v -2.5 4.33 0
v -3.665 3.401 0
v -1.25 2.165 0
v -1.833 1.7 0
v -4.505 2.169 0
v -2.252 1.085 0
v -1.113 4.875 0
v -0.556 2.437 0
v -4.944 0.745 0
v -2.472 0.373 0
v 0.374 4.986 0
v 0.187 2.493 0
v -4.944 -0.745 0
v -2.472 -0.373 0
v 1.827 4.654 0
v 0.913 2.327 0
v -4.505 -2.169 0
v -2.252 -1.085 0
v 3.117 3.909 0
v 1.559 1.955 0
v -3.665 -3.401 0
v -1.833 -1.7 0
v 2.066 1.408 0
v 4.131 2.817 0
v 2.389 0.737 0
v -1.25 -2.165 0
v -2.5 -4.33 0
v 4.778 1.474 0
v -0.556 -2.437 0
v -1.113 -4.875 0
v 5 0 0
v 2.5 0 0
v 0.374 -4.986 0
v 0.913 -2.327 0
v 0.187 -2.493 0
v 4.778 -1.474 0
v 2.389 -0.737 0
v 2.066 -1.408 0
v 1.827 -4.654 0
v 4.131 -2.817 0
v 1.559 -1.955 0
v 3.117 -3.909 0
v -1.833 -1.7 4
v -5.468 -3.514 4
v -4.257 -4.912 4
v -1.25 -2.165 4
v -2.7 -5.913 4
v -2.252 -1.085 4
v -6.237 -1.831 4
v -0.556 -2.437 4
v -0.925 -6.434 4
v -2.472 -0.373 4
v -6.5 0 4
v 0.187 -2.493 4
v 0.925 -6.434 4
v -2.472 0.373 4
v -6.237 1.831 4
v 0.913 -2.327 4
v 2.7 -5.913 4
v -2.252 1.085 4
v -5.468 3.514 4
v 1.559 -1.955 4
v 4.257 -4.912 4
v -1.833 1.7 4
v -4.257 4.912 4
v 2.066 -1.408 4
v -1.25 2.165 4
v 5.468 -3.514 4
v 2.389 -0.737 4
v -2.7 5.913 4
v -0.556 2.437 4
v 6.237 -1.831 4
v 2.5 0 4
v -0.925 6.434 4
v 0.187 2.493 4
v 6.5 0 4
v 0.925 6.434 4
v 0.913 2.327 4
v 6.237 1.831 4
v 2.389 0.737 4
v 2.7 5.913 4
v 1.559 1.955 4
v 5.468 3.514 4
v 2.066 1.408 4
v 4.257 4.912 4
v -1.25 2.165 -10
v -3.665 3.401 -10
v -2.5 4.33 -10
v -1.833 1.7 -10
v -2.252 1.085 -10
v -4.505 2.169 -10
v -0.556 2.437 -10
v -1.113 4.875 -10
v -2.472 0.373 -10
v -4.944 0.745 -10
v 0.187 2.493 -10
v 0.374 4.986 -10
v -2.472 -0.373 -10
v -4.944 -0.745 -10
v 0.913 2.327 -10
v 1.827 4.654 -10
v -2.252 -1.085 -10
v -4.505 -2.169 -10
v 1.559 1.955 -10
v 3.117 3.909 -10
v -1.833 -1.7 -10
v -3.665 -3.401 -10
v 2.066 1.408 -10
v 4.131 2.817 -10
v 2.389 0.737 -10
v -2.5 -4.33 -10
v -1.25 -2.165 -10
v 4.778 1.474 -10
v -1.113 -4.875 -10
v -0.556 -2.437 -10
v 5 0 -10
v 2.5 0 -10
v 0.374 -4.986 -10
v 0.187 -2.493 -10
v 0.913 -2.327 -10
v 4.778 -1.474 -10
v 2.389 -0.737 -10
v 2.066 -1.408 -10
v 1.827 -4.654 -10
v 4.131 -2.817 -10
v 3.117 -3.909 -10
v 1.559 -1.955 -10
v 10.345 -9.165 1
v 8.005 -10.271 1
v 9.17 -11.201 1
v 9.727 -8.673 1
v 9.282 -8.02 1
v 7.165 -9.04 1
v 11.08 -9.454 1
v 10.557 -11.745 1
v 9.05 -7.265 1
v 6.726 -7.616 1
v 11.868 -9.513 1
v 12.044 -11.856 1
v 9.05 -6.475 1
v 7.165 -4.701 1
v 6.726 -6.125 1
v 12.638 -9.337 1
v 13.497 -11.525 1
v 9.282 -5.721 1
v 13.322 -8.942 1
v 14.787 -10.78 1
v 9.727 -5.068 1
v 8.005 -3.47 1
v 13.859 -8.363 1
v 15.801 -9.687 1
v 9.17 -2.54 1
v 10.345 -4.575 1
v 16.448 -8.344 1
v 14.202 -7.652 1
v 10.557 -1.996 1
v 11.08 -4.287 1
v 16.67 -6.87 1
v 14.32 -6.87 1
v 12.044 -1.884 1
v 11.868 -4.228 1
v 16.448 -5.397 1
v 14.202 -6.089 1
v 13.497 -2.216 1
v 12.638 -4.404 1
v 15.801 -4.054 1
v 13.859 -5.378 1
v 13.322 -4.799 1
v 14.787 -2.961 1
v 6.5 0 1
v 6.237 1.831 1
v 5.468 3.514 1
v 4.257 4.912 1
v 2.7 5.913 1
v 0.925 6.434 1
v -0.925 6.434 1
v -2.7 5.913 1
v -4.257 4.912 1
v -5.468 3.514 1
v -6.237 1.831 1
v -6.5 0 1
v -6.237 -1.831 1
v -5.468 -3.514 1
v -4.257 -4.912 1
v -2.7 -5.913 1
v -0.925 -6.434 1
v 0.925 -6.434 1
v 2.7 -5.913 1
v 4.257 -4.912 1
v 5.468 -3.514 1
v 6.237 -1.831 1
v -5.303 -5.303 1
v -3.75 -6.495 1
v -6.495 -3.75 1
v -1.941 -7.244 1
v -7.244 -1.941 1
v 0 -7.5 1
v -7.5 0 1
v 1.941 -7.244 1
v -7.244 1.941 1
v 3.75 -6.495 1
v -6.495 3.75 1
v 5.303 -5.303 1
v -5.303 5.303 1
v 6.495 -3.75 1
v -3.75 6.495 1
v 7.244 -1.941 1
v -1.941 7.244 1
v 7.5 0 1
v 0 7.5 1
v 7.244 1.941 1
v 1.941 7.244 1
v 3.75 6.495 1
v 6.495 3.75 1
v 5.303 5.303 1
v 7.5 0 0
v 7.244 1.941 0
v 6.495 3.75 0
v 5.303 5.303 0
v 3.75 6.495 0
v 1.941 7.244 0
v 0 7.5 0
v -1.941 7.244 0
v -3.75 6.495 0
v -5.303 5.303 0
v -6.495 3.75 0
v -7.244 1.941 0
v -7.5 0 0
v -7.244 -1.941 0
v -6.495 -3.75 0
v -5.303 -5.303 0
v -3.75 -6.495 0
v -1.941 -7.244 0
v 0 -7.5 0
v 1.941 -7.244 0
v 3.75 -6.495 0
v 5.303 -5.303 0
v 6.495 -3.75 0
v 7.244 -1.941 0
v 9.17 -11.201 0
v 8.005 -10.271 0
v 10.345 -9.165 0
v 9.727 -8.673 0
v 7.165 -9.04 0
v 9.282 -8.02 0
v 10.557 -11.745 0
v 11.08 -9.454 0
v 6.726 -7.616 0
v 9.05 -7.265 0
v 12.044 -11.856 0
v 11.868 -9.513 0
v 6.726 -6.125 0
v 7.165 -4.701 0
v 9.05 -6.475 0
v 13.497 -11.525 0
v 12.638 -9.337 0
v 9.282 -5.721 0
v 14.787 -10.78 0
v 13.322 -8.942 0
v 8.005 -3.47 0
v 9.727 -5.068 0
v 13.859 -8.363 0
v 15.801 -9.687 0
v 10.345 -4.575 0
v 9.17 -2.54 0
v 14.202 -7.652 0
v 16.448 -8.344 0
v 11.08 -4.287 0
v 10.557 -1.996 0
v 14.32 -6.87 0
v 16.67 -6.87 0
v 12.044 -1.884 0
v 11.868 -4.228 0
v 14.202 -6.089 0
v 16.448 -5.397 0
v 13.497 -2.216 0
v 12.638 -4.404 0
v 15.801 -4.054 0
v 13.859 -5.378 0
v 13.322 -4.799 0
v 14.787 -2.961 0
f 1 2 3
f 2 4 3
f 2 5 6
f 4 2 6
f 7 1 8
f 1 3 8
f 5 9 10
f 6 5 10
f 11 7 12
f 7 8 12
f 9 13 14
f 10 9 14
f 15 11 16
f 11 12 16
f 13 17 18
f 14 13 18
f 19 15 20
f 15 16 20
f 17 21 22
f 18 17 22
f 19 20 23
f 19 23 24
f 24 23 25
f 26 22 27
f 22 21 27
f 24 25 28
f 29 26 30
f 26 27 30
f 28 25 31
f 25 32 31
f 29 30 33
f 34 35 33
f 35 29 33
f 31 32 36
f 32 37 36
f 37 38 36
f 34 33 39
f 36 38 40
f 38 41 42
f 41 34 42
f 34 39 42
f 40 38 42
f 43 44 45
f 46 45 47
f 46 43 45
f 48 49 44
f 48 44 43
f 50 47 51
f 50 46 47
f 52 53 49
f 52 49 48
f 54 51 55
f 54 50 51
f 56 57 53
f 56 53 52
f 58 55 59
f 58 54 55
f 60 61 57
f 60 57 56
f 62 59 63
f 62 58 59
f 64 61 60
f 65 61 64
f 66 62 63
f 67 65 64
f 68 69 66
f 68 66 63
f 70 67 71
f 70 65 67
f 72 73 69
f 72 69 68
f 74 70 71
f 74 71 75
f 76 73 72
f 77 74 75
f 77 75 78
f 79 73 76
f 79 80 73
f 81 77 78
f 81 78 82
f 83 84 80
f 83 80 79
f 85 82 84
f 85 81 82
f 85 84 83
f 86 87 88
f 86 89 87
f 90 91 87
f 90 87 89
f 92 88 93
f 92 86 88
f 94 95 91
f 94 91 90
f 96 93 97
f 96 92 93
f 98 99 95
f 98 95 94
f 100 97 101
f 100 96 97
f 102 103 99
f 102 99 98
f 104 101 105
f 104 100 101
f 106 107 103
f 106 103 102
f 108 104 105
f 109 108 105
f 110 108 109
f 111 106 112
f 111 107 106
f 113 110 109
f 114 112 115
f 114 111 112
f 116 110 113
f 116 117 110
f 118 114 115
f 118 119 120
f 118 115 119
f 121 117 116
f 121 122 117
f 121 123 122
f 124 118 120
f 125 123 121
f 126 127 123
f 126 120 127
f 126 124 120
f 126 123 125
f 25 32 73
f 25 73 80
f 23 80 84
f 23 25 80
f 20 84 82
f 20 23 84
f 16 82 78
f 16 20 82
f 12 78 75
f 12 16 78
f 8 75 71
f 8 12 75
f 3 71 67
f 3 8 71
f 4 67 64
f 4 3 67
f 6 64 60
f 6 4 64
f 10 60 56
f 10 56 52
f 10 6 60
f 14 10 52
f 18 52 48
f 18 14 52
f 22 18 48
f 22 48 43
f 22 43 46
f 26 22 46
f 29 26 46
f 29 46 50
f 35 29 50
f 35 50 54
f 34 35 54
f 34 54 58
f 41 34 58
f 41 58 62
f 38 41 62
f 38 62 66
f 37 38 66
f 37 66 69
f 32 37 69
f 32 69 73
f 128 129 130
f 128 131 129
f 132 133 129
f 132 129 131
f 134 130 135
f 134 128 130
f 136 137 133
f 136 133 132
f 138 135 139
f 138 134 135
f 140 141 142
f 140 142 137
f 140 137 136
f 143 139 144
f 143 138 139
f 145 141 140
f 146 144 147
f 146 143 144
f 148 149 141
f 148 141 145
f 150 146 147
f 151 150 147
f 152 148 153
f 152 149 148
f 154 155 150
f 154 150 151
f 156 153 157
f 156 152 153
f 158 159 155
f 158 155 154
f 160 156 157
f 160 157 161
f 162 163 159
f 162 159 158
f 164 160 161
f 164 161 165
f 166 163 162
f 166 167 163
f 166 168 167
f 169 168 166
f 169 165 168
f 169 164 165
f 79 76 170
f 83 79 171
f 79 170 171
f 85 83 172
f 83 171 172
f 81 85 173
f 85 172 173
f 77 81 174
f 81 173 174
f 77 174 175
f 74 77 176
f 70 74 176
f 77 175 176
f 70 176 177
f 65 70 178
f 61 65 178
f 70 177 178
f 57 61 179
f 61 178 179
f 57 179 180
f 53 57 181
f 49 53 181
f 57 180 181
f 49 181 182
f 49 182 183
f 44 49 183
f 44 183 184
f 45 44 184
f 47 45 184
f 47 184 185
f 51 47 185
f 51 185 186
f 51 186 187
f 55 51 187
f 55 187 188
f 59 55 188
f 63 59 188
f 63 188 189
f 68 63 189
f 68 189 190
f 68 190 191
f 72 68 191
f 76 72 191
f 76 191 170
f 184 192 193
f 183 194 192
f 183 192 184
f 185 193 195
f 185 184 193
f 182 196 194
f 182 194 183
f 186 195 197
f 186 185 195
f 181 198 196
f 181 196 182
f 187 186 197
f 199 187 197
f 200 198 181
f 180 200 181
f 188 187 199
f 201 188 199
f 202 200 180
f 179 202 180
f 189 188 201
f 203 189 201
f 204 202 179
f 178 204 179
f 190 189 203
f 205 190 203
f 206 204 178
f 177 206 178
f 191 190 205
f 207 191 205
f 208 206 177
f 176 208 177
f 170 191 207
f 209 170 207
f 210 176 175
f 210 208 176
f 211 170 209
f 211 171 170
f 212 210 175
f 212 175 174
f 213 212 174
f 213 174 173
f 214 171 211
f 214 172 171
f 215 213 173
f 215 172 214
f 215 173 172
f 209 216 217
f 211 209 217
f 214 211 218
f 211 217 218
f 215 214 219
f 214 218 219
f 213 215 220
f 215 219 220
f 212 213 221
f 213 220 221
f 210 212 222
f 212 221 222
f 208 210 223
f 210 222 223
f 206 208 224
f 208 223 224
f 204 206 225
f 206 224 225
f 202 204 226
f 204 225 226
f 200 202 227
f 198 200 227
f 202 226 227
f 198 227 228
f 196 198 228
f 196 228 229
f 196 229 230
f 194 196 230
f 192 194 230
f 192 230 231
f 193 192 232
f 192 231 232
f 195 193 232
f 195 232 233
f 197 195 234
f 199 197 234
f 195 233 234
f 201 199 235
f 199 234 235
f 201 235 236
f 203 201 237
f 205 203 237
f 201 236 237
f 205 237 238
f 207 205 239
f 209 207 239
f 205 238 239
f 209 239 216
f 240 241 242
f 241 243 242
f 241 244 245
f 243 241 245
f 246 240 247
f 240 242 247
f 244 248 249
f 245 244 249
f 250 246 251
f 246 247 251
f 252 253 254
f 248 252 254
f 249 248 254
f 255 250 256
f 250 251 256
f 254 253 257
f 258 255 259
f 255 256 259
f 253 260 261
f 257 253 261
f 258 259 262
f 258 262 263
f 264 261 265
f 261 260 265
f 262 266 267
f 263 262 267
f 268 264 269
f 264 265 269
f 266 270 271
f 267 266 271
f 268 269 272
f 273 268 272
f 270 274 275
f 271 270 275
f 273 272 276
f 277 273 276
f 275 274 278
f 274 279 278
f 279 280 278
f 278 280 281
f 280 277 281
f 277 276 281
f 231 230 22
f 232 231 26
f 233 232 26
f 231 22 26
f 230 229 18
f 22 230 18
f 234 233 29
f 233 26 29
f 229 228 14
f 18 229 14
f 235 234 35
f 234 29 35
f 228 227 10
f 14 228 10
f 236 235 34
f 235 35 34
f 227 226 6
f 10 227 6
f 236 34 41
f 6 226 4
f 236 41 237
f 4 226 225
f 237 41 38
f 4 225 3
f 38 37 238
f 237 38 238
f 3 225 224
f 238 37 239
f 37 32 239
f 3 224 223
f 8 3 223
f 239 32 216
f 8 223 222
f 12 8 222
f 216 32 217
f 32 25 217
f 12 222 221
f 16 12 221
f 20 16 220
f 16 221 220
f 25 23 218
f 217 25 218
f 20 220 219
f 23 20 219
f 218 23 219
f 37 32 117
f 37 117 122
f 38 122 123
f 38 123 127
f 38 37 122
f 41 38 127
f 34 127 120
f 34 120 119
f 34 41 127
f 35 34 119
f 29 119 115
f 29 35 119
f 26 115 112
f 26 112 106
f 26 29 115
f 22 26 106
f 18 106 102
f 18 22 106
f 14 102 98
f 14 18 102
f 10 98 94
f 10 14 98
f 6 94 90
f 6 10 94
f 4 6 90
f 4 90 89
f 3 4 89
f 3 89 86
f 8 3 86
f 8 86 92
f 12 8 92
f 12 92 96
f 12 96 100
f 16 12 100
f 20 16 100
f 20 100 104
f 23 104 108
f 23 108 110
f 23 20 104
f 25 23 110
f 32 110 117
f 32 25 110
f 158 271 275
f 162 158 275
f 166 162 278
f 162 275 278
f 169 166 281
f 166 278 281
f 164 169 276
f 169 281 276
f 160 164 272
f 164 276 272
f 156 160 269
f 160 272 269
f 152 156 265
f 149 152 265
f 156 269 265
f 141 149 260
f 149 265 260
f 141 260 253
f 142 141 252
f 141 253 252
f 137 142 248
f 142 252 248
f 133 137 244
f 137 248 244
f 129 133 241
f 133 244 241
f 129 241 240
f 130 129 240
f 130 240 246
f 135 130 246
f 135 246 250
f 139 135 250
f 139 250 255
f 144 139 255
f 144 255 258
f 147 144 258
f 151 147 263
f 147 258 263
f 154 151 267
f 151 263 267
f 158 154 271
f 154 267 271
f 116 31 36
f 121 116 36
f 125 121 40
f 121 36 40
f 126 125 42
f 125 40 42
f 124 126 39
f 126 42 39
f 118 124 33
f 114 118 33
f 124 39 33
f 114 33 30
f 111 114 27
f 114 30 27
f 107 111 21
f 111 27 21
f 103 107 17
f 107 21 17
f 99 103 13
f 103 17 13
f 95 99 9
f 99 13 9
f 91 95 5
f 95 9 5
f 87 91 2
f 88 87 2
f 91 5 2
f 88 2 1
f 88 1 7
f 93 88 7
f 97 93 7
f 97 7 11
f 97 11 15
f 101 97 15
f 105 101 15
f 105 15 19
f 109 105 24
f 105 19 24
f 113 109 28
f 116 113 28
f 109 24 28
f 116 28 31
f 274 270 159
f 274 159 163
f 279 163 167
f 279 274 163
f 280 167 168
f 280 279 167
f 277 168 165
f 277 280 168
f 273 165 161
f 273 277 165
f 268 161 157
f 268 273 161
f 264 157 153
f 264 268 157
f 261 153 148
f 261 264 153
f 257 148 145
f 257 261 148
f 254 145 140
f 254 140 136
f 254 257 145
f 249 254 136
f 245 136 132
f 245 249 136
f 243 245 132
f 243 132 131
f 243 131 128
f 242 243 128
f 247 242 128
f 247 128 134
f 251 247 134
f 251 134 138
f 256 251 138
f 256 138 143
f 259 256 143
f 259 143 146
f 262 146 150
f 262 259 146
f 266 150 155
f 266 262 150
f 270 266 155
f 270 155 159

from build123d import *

# Parameters (mm, degrees)
F0_R     = 7.5
F0_R_2   = 6.5
F0_R_3   = 2.5
F1_DEPTH = 1
F2_DEPTH = 4
F3_R     = 5
F3_R_2   = 2.5
F4_DEPTH = 10
F5_R     = 5
F5_R_2   = 2.65
F6_DEPTH = 1


with BuildPart() as f1:
    # F0 (on Top) → F1 (new body)
    with BuildSketch(Plane.XY):
        Circle(F0_R)
        Circle(F0_R_2, mode=Mode.SUBTRACT)
        Circle(F0_R_2)
        Circle(F0_R_3, mode=Mode.SUBTRACT)
    extrude(amount=F1_DEPTH)

    # F0 (on Top) → F2 (join)
    with BuildSketch(Plane.XY):
        Circle(F0_R_2)
        Circle(F0_R_3, mode=Mode.SUBTRACT)
    extrude(amount=F2_DEPTH)


with BuildPart() as f4:
    # F3 (on face) → F4 (new body)
    with BuildSketch(Plane(origin=(0, 0, 0), x_dir=(1, 0, 0), z_dir=(0, 0, -1))):
        Circle(F3_R)
        Circle(F3_R_2, mode=Mode.SUBTRACT)
    extrude(amount=F4_DEPTH)


with BuildPart() as f6:
    # F5 (on Top) → F6 (new body)
    with BuildSketch(Plane.XY):
        with Locations((11.669965, -6.87046)):
            Circle(F5_R)
        with Locations((11.669965, -6.87046)):
            Circle(F5_R_2, mode=Mode.SUBTRACT)
    extrude(amount=F6_DEPTH)


solid = Compound([f1.part, f4.part, f6.part])
